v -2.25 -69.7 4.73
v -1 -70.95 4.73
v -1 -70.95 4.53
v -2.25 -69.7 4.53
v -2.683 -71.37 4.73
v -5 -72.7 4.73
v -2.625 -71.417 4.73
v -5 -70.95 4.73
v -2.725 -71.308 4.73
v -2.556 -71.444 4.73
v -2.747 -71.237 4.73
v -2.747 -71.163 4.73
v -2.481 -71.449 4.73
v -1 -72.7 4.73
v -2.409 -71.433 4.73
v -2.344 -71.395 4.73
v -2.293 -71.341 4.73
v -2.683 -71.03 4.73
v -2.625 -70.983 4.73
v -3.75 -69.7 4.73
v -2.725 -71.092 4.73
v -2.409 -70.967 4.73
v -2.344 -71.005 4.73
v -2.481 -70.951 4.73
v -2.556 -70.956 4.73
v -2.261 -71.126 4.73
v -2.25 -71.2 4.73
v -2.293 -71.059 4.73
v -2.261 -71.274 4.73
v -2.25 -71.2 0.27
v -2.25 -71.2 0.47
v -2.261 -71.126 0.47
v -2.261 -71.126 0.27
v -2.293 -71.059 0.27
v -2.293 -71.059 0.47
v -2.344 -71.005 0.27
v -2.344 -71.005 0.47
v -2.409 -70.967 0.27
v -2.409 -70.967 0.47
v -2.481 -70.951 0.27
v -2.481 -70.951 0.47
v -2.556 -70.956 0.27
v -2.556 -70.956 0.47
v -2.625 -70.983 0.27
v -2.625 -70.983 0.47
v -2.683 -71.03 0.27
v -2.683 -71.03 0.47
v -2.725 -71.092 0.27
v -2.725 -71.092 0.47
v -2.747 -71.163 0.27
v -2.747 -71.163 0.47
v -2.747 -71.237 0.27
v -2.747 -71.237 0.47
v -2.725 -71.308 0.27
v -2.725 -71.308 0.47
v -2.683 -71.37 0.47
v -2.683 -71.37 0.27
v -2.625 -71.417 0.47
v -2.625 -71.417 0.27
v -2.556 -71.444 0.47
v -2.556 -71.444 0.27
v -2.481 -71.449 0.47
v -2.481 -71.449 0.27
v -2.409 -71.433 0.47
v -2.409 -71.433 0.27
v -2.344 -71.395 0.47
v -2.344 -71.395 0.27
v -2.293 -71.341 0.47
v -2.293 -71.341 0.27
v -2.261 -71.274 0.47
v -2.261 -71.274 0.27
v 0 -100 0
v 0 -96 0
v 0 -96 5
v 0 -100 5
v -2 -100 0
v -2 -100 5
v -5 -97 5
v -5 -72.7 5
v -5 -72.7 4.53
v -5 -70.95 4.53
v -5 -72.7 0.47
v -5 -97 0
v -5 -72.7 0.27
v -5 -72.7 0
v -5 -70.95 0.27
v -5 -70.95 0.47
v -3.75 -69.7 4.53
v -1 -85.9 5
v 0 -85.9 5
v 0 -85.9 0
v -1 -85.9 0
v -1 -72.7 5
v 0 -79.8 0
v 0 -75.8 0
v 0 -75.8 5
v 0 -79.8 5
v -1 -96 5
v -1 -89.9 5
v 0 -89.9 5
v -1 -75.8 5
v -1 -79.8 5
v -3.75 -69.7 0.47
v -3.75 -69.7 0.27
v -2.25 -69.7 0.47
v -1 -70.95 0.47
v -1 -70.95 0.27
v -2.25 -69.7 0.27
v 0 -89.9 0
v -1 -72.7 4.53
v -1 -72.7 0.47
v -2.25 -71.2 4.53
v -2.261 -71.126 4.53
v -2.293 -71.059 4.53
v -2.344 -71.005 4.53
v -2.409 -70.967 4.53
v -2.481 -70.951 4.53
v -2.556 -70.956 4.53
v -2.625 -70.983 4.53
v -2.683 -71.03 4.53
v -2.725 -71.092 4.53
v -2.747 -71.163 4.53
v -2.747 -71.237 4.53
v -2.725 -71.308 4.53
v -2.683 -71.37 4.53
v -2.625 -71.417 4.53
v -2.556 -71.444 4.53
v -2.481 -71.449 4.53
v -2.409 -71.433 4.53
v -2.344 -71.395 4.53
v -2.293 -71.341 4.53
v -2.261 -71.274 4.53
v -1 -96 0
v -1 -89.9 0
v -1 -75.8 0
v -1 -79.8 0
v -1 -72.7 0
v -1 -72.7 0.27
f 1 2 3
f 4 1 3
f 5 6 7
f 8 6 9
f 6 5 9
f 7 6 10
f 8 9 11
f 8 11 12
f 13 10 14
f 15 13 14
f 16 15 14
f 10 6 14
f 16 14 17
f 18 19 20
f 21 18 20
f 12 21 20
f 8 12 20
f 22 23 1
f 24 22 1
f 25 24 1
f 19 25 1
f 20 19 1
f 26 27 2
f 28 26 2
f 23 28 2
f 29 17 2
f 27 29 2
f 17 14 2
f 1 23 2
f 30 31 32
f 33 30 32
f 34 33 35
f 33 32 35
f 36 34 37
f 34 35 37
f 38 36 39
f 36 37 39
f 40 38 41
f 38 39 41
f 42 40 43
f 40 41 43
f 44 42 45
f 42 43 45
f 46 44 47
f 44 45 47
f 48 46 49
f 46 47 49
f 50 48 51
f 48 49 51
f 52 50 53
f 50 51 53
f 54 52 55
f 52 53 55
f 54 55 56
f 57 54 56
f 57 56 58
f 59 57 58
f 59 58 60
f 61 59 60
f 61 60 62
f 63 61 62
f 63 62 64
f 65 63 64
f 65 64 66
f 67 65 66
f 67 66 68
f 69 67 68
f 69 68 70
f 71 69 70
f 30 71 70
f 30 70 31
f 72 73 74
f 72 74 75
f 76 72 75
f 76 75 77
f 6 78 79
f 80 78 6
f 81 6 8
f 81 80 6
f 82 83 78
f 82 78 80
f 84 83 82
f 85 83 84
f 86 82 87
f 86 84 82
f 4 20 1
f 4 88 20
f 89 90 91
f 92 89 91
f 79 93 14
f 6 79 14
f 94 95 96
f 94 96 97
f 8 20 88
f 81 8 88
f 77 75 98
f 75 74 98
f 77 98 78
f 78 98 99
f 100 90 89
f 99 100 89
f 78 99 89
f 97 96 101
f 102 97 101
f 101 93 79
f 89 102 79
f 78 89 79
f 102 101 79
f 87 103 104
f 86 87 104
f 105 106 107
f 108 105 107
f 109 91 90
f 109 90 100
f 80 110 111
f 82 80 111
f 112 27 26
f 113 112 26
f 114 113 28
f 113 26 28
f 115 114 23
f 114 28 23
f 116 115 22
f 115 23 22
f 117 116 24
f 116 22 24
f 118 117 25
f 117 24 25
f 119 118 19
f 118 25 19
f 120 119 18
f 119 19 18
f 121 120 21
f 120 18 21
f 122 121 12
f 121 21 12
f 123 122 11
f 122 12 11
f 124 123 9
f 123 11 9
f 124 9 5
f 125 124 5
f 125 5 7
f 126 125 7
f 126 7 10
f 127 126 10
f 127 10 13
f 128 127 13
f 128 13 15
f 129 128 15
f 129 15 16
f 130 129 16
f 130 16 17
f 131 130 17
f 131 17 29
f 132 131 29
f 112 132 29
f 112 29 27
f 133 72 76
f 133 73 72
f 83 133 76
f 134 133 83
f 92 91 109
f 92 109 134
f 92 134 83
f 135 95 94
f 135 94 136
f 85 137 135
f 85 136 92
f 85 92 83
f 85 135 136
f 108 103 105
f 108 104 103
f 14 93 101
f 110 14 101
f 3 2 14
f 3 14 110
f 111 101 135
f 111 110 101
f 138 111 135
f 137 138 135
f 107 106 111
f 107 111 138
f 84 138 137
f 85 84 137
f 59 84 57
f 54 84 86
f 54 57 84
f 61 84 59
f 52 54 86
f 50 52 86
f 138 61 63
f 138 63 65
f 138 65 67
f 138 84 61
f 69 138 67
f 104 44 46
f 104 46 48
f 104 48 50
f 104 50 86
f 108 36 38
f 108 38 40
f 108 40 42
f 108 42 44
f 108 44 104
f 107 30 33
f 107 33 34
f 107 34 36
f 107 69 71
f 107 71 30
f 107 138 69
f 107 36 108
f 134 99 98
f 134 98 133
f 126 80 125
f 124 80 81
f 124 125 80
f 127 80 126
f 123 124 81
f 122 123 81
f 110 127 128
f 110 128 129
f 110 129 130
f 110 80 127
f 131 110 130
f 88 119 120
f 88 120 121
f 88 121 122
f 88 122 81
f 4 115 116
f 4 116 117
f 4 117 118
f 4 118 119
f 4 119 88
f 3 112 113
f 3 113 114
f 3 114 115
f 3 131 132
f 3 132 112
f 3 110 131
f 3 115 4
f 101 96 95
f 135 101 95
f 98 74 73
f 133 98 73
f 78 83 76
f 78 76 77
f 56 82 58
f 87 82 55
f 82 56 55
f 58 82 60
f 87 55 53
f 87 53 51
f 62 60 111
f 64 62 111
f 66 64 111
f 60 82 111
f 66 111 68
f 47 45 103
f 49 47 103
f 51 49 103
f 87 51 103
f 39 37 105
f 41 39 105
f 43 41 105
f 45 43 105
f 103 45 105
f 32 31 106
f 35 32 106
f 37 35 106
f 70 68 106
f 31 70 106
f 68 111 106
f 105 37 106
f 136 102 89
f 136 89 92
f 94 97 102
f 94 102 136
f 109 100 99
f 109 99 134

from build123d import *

# Parameters (mm, degrees)
BOSS_EXTRUDE1_DEPTH     = 5
SKETCH4_W               = 5
SKETCH4_H               = 6.1
CUT_EXTRUDE1_DEPTH      = 1
CHAMFER1_SIZE           = 3
CUT_EXTRUDE8_DEPTH      = 104.701494685
CUT_EXTRUDE8_DEPTH_BACK = 104.701494685
SKETCH13_R              = 0.25
CUT_EXTRUDE9_DEPTH      = 101.249688279
SKETCH14_W              = 0.27
SKETCH14_H              = 3
CUT_EXTRUDE11_DEPTH     = 101.204790305
SKETCH16_W              = 4.06
SKETCH16_H              = 3
CUT_EXTRUDE12_DEPTH     = 101.204790305
CHAMFER4_SIZE           = 1.25
CHAMFER7_SIZE           = 1.25
CHAMFER8_SIZE           = 1.25
CHAMFER9_SIZE           = 1.25


with BuildPart() as part:
    # Sketch1 → Boss-Extrude1 (new body)
    with BuildSketch(Plane.XY):
        with BuildLine():
            Line((0, -100), (-5, -100))
            Line((-5, -100), (-5, -60))
            Line((-5, -60), (-12, -5))
            Line((-12, -5), (-27, -5))
            Line((-27, -5), (-27, 0))
            Line((-27, 0), (-3, 0))
            Line((-3, 0), (-3, -37.2))
            ThreePointArc((-3, -37.2), (-2.179898987, -39.179898987), (-0.2, -40))
            Line((-0.2, -40), (0, -40))
            Line((0, -40), (0, -100))
        make_face()
    extrude(amount=BOSS_EXTRUDE1_DEPTH)

    # Sketch4 → Cut-Extrude1 (cut)
    with BuildSketch(Plane(origin=(0, 0, 0), x_dir=(0, 0, -1), z_dir=(1, 0, 0))):
        with Locations((-2.5, -92.95)):
            Rectangle(SKETCH4_W, SKETCH4_H)
        with Locations((-2.5, -82.85)):
            Rectangle(SKETCH4_W, SKETCH4_H)
        with Locations((-2.5, -72.75)):
            Rectangle(SKETCH4_W, SKETCH4_H)
        with Locations((-2.5, -62.65)):
            Rectangle(SKETCH4_W, SKETCH4_H)
        with Locations((-2.5, -52.55)):
            Rectangle(SKETCH4_W, SKETCH4_H)
        with Locations((-2.5, -42.45)):
            Rectangle(SKETCH4_W, SKETCH4_H)
    extrude(amount=-CUT_EXTRUDE1_DEPTH, mode=Mode.SUBTRACT)

    # Chamfer1
    chamfer1_edges = [part.edges().sort_by_distance(p)[0] for p in [
        (-5, -100, 2.5),
    ]]
    chamfer(chamfer1_edges, length=CHAMFER1_SIZE)

    # Sketch9 → Cut-Extrude8 (cut, two sides: drawn at the far end of the back side and taken through both)
    with BuildSketch(Plane.XY.offset(5).offset(-CUT_EXTRUDE8_DEPTH_BACK)):
        Polygon((157.782929128, -69.7), (-1, -69.7), (-5, -69.7), (-163.782929128, -69.7), (-163.782929128, 247.865858257), (157.782929128, 247.865858257), align=None)
    extrude(amount=CUT_EXTRUDE8_DEPTH + CUT_EXTRUDE8_DEPTH_BACK, mode=Mode.SUBTRACT)

    # Sketch13 → Cut-Extrude9 (cut, through all)
    with BuildSketch(Plane.XY.offset(5)):
        with Locations((-2.5, -71.2)):
            Circle(SKETCH13_R)
    extrude(amount=-CUT_EXTRUDE9_DEPTH, mode=Mode.SUBTRACT)

    # Sketch14 → Cut-Extrude11 (cut, through all)
    with BuildSketch(Plane(origin=(-1, 0, 0), x_dir=(0, 0, -1), z_dir=(1, 0, 0))):
        with Locations((-4.865, -71.2)):
            Rectangle(SKETCH14_W, SKETCH14_H)
        with Locations((-0.135, -71.2)):
            Rectangle(SKETCH14_W, SKETCH14_H)
    extrude(amount=-CUT_EXTRUDE11_DEPTH, mode=Mode.SUBTRACT)

    # Sketch16 → Cut-Extrude12 (cut, through all)
    with BuildSketch(Plane(origin=(-1, 0, 0), x_dir=(0, 0, -1), z_dir=(1, 0, 0))):
        with Locations((-2.5, -71.2)):
            Rectangle(SKETCH16_W, SKETCH16_H)
    extrude(amount=-CUT_EXTRUDE12_DEPTH, mode=Mode.SUBTRACT)

    # Chamfer4
    chamfer4_edges = [part.edges().sort_by_distance(p)[0] for p in [
        (-1, -69.7, 4.63),
    ]]
    chamfer(chamfer4_edges, length=CHAMFER4_SIZE)

    # Chamfer7
    chamfer7_edges = [part.edges().sort_by_distance(p)[0] for p in [
        (-1, -69.7, 0.37),
    ]]
    chamfer(chamfer7_edges, length=CHAMFER7_SIZE)

    # Chamfer8
    chamfer8_edges = [part.edges().sort_by_distance(p)[0] for p in [
        (-5, -69.7, 4.63),
    ]]
    chamfer(chamfer8_edges, length=CHAMFER8_SIZE)

    # Chamfer9
    chamfer9_edges = [part.edges().sort_by_distance(p)[0] for p in [
        (-5, -69.7, 0.37),
    ]]
    chamfer(chamfer9_edges, length=CHAMFER9_SIZE)


solid = part.part
